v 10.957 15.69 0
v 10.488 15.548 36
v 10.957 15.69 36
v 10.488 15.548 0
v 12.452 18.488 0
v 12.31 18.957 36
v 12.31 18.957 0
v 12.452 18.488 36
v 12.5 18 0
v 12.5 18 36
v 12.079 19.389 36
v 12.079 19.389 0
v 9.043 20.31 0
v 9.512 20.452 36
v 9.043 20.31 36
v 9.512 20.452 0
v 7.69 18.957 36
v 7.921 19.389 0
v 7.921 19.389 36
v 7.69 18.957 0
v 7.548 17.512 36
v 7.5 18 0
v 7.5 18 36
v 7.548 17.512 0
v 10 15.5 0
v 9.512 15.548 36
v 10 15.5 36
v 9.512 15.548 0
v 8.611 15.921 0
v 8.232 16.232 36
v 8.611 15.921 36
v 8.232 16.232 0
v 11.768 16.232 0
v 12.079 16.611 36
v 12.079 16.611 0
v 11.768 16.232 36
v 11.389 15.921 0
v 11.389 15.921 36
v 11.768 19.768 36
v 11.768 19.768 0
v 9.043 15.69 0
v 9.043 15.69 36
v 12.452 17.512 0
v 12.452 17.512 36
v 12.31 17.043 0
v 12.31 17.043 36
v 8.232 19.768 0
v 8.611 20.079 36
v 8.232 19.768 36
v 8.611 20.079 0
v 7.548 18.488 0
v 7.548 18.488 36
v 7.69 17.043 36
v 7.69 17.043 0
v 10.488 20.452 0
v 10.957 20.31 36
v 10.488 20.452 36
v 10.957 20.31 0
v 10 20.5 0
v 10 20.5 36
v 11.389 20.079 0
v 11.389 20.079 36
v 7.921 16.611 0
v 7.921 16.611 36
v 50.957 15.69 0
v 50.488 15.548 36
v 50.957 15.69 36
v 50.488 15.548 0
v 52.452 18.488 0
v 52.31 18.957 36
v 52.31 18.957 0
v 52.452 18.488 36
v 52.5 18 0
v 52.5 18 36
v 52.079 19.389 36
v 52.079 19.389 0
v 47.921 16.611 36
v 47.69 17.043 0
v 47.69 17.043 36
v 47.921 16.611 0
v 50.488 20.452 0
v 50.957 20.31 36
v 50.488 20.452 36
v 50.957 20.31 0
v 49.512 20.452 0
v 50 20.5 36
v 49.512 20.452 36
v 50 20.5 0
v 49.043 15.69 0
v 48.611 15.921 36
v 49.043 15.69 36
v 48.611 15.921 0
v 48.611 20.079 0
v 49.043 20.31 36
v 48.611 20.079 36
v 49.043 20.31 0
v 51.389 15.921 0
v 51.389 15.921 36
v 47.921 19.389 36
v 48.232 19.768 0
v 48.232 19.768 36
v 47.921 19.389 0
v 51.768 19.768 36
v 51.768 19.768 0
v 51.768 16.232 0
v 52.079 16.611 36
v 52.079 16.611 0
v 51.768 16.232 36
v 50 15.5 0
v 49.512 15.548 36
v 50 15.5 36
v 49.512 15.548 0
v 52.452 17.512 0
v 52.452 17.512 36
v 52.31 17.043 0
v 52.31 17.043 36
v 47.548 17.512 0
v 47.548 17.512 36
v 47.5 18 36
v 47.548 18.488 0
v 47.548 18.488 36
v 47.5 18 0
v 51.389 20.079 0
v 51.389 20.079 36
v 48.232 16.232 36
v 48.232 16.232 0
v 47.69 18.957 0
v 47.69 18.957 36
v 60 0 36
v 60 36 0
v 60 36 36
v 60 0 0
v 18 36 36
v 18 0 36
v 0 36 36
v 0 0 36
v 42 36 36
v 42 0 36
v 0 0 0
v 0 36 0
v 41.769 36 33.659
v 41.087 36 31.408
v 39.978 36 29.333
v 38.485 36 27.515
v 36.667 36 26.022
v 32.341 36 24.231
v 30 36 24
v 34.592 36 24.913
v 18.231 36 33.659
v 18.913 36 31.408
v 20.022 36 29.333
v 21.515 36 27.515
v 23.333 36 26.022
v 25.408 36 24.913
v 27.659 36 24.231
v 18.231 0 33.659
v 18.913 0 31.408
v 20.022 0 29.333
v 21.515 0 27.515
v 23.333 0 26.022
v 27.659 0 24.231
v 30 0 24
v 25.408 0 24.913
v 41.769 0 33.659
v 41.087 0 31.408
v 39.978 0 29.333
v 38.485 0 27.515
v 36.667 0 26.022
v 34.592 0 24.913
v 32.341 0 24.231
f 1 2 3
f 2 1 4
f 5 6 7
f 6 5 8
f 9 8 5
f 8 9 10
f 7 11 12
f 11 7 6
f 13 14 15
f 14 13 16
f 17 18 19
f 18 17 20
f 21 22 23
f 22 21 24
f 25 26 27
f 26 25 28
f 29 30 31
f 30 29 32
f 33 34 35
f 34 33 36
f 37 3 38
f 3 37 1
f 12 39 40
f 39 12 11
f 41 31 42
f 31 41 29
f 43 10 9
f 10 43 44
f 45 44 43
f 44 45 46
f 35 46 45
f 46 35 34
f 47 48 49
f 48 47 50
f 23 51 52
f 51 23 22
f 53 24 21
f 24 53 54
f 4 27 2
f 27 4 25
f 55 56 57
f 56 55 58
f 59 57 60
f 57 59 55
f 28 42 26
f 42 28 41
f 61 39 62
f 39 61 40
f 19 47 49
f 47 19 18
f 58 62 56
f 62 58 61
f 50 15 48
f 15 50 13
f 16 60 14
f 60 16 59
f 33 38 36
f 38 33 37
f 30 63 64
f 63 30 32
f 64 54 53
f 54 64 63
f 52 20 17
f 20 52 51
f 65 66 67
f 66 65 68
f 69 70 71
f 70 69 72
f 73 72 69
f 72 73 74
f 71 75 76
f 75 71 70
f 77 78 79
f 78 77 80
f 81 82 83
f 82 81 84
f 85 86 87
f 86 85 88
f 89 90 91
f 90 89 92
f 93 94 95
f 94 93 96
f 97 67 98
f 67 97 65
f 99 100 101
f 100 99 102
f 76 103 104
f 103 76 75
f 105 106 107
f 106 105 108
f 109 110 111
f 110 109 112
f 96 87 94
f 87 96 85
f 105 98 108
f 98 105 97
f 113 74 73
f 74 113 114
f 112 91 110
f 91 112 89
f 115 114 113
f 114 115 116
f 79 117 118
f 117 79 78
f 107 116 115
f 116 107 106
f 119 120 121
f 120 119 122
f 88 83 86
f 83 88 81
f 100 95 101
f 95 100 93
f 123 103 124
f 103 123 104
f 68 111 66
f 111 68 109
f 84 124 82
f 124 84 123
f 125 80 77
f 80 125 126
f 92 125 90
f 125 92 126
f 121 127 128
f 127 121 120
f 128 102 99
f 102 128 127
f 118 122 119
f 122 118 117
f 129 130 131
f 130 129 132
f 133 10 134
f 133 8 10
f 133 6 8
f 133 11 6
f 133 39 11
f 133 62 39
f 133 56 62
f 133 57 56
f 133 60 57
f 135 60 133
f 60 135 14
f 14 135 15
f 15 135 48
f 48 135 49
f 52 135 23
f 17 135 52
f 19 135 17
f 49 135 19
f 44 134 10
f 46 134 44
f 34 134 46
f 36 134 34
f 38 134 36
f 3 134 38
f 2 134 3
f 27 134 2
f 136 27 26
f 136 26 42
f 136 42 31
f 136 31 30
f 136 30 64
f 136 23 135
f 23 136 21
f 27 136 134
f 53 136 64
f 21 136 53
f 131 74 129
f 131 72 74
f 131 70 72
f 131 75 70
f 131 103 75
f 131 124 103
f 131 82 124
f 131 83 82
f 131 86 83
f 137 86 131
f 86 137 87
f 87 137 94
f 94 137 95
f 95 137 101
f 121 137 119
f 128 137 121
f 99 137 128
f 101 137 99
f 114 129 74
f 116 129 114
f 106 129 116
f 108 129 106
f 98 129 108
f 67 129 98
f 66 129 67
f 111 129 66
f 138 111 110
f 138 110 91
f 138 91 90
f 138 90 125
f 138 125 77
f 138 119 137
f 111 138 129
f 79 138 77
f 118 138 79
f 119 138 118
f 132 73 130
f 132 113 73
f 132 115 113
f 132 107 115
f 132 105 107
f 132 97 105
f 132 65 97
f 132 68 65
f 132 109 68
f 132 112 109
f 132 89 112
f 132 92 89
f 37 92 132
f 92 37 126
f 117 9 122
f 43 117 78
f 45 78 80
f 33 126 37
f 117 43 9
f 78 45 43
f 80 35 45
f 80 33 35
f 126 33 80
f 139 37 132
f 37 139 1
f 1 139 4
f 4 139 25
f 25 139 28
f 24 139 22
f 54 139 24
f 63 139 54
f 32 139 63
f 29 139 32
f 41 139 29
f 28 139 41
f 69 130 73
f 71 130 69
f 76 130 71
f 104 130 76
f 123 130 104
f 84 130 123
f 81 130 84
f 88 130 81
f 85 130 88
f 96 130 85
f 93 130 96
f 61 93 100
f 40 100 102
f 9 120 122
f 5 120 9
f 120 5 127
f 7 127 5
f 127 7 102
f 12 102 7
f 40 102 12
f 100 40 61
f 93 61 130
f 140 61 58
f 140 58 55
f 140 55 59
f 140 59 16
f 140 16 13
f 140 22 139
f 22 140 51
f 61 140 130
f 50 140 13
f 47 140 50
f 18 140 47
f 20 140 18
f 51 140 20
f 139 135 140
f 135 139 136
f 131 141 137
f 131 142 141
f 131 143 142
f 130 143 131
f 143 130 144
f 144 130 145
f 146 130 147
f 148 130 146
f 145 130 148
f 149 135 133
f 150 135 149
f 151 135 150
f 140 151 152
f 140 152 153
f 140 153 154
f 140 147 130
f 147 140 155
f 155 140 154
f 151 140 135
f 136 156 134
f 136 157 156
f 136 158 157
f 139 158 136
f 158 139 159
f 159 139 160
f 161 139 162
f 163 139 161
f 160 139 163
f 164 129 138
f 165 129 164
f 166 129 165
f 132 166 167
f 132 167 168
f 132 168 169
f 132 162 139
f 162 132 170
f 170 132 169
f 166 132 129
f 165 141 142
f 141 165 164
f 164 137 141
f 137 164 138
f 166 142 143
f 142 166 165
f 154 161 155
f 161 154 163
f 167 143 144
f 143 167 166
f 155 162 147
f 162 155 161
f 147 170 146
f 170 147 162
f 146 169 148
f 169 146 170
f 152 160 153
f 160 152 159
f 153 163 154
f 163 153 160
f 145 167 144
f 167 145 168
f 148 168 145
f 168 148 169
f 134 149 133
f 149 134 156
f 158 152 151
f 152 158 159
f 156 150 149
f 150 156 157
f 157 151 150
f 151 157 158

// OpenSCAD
$fn = 32;

// ----------------------------------------------------------------------
// Saddle clamp: plain shaft clamp
// ----------------------------------------------------------------------

// --- parameters (mm) ---
blk_l = 60;               // block length, X
blk_w = 36;               // block width, Y
blk_h = 36;               // block height
clamp_r = 12;             // shaft groove radius
hole_r = 2.5;             // bolt hole radius
hole_m = 10;              // bolt hole margin from the ends

saw_depth = clamp_r + 3;  // saw kerf depth

difference() {
  cube([blk_l, blk_w, blk_h]);
  translate([blk_l / 2, -1, blk_h])
    rotate([-90, 0, 0])
      cylinder(h = blk_w + 2, r = clamp_r);
  for (sx = [0, 1])
    translate([sx ? blk_l - hole_m : hole_m, blk_w / 2, -1])
      cylinder(r = hole_r, h = blk_h + 2);
}
